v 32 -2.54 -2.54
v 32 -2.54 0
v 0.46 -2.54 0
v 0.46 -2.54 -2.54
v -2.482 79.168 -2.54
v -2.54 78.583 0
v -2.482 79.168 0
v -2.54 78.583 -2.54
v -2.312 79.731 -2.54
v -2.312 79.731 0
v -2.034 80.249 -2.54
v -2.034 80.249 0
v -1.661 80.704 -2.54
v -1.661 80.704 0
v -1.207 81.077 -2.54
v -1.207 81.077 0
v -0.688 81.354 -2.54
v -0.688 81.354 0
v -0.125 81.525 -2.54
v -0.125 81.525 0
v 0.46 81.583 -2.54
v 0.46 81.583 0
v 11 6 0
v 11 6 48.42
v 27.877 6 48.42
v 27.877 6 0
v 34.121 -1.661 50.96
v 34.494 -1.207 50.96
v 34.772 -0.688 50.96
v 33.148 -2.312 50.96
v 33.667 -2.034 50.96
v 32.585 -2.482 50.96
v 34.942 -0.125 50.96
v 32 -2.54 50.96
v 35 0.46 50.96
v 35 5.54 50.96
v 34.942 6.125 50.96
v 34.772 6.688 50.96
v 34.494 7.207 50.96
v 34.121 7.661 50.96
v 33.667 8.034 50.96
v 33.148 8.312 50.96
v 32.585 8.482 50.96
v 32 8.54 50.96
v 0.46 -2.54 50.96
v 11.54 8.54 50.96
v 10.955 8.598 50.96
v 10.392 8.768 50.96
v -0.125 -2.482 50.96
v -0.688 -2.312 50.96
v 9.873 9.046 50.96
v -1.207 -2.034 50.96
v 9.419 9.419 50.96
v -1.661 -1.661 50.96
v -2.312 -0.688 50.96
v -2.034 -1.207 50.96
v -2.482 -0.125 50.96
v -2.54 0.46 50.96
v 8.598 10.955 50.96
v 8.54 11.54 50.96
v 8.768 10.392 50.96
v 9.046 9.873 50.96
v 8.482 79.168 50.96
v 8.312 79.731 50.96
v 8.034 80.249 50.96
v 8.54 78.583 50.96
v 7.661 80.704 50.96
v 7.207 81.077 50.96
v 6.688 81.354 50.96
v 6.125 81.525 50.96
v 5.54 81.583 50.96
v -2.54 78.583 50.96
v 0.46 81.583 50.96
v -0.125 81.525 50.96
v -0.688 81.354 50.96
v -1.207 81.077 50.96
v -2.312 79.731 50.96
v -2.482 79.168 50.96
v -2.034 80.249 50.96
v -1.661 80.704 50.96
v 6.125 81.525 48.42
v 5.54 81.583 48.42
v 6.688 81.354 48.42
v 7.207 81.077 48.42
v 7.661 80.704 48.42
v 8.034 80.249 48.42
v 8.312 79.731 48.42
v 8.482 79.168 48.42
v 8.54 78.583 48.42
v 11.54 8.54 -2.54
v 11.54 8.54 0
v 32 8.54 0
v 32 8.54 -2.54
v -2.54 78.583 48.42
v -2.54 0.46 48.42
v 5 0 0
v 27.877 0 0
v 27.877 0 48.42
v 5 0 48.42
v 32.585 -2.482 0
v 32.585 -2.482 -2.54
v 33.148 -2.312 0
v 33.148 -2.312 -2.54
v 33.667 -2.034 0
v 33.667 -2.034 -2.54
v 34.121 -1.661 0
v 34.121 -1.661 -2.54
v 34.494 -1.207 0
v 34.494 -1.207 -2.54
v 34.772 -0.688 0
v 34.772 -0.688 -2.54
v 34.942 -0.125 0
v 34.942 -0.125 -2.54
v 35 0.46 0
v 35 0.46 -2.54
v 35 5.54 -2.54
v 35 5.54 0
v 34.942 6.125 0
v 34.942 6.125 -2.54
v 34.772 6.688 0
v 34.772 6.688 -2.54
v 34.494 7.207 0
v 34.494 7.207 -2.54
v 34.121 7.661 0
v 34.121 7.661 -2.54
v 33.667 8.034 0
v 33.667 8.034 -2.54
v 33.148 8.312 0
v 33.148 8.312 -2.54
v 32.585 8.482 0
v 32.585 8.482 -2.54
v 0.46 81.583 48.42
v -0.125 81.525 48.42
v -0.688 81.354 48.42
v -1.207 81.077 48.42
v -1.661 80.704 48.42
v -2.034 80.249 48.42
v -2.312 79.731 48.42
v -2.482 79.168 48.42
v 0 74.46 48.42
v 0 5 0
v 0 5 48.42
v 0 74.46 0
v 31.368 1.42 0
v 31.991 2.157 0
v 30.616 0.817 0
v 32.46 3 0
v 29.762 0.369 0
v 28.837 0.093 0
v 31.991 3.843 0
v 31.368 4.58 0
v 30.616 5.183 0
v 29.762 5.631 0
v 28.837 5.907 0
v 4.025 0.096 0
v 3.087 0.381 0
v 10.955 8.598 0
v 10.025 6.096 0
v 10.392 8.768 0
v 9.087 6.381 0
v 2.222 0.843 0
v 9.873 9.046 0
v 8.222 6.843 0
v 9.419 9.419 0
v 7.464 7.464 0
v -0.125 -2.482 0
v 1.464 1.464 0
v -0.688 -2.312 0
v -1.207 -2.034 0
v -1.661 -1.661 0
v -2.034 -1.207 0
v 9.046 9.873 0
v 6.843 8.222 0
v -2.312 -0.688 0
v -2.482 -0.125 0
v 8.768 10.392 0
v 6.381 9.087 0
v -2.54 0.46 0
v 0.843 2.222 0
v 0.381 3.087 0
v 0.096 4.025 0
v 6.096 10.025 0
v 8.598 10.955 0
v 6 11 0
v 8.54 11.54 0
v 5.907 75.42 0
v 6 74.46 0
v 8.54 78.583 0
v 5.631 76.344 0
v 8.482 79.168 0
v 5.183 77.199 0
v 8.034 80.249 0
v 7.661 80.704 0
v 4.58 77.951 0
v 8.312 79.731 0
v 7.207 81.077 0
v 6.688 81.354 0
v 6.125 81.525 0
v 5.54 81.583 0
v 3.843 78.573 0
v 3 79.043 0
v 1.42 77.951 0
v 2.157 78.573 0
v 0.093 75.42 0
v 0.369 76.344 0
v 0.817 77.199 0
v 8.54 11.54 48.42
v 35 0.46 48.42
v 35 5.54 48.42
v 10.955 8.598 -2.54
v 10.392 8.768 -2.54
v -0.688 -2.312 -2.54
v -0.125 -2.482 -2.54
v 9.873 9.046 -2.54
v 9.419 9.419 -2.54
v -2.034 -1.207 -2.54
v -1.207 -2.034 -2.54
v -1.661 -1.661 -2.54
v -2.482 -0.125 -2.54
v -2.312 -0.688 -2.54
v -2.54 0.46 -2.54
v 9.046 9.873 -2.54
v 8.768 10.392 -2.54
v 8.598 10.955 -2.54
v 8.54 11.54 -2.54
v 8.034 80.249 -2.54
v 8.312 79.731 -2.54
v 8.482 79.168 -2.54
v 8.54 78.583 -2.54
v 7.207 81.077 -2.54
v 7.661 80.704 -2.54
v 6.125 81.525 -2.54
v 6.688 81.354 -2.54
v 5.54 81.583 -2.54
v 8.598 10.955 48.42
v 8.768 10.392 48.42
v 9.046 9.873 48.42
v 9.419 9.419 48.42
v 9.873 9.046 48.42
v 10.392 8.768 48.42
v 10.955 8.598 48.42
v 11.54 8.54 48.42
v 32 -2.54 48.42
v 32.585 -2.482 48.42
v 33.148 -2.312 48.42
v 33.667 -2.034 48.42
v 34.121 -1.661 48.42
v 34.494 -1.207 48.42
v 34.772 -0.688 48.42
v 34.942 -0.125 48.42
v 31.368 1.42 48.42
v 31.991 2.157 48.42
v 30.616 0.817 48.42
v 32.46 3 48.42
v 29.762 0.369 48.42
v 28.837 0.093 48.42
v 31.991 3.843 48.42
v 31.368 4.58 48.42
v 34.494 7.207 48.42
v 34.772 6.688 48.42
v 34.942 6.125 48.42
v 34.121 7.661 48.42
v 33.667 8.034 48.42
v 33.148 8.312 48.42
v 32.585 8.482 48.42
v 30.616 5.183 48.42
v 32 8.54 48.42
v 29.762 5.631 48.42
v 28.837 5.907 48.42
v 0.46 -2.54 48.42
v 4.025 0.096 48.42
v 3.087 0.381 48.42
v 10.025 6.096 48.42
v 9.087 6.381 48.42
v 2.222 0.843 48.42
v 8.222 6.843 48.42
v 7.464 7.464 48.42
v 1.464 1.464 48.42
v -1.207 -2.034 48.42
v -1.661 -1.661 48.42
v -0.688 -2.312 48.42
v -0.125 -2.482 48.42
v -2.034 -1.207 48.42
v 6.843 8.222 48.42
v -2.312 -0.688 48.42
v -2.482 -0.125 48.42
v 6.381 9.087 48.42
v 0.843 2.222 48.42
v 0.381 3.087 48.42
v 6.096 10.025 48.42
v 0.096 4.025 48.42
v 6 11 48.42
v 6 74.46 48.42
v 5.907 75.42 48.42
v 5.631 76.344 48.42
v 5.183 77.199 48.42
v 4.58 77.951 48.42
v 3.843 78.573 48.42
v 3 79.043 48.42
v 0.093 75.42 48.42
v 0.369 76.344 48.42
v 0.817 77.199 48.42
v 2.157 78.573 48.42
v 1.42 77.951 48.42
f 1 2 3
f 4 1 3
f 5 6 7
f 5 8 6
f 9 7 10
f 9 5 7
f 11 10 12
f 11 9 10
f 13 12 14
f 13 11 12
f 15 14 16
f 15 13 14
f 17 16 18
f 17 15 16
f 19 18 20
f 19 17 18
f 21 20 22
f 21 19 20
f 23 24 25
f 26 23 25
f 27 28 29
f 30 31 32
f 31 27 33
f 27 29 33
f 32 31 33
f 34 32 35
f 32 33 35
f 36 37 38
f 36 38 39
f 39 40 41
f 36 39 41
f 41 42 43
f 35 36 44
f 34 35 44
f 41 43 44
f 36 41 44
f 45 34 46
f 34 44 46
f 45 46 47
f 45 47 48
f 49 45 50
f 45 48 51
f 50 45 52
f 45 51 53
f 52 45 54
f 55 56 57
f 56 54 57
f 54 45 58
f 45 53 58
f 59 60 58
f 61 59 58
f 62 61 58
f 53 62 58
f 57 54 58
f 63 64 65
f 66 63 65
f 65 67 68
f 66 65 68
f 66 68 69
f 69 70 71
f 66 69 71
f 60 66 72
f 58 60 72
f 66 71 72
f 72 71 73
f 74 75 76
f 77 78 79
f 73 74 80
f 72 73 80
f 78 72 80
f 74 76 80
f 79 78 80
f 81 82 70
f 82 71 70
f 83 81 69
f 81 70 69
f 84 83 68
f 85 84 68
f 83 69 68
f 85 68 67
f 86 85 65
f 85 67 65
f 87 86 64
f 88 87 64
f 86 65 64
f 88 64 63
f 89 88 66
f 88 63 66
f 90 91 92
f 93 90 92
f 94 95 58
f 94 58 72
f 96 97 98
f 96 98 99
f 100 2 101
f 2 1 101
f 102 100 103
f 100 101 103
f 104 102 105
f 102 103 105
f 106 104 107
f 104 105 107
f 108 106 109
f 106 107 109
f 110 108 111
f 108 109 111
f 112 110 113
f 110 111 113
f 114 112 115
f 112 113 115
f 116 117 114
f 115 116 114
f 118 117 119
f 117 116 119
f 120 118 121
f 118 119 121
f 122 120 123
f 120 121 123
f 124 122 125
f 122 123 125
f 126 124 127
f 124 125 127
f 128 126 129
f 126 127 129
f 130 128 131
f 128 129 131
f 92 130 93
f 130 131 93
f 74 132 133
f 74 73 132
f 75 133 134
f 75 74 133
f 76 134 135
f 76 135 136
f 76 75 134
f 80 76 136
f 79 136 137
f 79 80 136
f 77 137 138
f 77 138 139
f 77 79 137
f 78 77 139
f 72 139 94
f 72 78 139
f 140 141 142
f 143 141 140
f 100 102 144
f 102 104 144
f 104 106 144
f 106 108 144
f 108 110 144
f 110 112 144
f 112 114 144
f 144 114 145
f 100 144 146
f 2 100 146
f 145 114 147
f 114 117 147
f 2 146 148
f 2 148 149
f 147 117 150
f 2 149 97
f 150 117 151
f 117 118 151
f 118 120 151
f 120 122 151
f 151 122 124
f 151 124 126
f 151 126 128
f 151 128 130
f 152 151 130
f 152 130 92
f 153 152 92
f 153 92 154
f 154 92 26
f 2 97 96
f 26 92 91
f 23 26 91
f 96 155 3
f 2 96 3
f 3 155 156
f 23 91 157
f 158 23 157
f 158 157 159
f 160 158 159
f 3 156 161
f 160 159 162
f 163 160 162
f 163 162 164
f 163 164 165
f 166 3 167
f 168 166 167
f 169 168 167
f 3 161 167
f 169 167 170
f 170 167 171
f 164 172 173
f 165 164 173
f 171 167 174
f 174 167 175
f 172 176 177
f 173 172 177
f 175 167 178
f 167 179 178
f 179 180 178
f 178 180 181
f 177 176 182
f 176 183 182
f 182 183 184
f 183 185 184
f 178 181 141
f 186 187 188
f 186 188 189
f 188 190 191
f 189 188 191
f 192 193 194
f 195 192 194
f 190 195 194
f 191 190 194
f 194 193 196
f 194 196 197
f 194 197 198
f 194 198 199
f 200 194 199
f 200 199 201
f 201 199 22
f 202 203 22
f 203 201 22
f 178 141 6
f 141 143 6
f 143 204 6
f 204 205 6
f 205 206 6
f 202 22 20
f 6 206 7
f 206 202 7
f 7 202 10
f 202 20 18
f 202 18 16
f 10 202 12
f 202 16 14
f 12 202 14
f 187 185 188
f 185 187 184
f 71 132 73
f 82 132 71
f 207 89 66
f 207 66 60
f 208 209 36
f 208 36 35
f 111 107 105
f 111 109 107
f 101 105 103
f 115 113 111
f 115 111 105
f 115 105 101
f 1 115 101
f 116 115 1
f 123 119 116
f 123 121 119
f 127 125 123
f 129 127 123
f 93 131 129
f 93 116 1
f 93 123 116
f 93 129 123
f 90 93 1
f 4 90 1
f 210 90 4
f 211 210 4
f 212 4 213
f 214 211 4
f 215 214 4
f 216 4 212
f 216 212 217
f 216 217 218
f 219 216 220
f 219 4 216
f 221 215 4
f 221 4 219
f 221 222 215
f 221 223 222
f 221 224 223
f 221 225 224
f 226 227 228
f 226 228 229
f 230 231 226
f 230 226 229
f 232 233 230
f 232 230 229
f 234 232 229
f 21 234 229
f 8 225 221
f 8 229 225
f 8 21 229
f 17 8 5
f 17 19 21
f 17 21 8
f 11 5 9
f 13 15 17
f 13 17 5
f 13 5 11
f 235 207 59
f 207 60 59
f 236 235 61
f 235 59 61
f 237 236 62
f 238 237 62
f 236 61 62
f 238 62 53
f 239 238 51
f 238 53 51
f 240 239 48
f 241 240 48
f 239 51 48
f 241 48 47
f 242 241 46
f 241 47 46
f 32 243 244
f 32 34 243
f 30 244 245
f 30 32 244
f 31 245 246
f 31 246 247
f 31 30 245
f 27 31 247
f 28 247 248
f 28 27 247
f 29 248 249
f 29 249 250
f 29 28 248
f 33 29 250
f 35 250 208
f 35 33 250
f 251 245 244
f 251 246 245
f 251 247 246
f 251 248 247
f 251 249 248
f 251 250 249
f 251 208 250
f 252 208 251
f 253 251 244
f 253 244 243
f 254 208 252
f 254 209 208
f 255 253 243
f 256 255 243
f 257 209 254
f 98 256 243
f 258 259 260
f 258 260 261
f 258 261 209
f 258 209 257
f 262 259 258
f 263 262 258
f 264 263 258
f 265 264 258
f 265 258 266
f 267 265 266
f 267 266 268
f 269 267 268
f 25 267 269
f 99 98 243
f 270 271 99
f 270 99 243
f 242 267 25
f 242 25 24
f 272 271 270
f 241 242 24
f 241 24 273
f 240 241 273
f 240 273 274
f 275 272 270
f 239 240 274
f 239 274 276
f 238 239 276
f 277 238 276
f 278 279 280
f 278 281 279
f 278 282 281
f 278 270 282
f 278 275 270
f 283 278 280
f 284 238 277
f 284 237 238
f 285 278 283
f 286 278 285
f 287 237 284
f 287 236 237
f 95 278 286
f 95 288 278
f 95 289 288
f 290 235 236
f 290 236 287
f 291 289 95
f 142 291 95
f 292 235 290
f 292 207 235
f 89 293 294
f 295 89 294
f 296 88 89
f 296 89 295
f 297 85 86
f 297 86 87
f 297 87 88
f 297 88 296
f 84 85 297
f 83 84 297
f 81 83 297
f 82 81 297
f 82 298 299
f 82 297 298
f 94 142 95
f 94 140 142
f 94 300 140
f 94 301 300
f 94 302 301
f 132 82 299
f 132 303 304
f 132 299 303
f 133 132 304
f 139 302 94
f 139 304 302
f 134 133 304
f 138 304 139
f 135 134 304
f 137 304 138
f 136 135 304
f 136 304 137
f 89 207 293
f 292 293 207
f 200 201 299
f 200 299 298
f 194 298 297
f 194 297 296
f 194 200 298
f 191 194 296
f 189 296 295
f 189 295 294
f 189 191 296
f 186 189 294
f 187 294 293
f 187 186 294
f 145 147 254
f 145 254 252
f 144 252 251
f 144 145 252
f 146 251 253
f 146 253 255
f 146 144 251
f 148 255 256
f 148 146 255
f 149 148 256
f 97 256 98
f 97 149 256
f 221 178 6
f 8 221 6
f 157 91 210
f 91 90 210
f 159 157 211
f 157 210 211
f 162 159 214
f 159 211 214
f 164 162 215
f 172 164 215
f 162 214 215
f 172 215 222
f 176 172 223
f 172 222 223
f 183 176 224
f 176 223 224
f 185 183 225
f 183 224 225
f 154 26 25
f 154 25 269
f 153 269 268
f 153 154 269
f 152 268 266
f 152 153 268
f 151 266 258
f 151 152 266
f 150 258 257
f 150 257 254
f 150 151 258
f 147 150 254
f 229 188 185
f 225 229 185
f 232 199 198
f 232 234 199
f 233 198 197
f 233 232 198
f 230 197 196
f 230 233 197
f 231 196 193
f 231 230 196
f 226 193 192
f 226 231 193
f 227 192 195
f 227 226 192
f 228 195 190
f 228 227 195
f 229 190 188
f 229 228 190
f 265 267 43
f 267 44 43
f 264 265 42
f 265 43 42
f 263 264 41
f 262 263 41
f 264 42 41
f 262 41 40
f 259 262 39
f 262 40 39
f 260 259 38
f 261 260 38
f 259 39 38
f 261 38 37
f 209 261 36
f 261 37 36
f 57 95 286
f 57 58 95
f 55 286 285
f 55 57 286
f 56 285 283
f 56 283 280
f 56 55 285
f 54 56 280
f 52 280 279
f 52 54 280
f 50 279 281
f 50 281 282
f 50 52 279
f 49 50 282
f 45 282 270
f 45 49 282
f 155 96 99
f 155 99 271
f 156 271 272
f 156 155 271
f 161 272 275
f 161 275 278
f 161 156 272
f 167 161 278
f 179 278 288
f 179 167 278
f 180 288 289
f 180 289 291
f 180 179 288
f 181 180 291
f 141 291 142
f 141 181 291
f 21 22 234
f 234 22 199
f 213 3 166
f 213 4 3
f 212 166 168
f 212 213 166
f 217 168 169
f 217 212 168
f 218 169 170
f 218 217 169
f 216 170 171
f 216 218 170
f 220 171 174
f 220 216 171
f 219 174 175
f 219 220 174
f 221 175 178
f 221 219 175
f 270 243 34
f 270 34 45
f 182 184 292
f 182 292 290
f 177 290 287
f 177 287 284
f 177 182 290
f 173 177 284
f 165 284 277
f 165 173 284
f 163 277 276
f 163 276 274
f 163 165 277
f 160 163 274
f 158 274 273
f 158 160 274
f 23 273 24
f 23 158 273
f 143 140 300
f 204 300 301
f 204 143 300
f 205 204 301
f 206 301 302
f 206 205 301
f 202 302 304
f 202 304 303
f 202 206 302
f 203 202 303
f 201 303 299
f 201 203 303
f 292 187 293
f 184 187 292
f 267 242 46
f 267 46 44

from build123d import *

# Parameters (mm, degrees)
BOSS_EXTRUDE1_DEPTH = 48.42
BOSS_EXTRUDE2_DEPTH = 2.54
BOSS_EXTRUDE3_DEPTH = 2.54
FILLET1_R           = 3


with BuildPart() as part:
    # Sketch2 → Boss-Extrude1 (new body)
    with BuildSketch(Plane.XY):
        with BuildLine():
            Line((0, 5), (0, 74.46))
            ThreePointArc((0, 74.46), (0.816699867, 77.198612788), (3, 79.042575695))
            ThreePointArc((3, 79.042575695), (5.183300133, 77.198612788), (6, 74.46))
            Line((6, 74.46), (6, 11))
            ThreePointArc((6, 11), (7.464466094, 7.464466094), (11, 6))
            Line((11, 6), (27.877424305, 6))
            ThreePointArc((27.877424305, 6), (30.616037093, 5.183300133), (32.46, 3))
            ThreePointArc((32.46, 3), (30.616037093, 0.816699867), (27.877424305, 0))
            Line((27.877424305, 0), (6, 0))
            Line((6, 0), (5, 0))
            ThreePointArc((5, 0), (1.464466094, 1.464466094), (0, 5))
        make_face()
    extrude(amount=BOSS_EXTRUDE1_DEPTH)

    # Sketch3 → Boss-Extrude2 (add)
    with BuildSketch(Plane.XY.offset(48.42)):
        Polygon((-2.54, 81.582575695), (8.54, 81.582575695), (8.54, 8.54), (35, 8.54), (35, -2.54), (-2.54, -2.54), align=None)
    extrude(amount=BOSS_EXTRUDE2_DEPTH)

    # Sketch4 → Boss-Extrude3 (add)
    with BuildSketch(Plane(origin=(0, 0, 0), x_dir=(-1, 0, 0), z_dir=(0, 0, -1))):
        Polygon((-35, -2.54), (2.54, -2.54), (2.54, 81.582575695), (-8.54, 81.582575695), (-8.54, 8.54), (-35, 8.54), align=None)
    extrude(amount=BOSS_EXTRUDE3_DEPTH)

    # Fillet1
    fillet1_edges = [part.edges().sort_by_distance(p)[0] for p in [
        (-2.54, 81.582575695, 49.69),
        (-2.54, -2.54, 49.69),
        (35, -2.54, 49.69),
        (35, 8.54, 49.69),
        (8.54, 8.54, 49.69),
        (8.54, 81.582575695, 49.69),
        (35, 8.54, -1.27),
        (35, -2.54, -1.27),
        (-2.54, -2.54, -1.27),
        (-2.54, 81.582575695, -1.27),
        (8.54, 81.582575695, -1.27),
        (8.54, 8.54, -1.27),
    ]]
    fillet(fillet1_edges, radius=FILLET1_R)


solid = part.part
